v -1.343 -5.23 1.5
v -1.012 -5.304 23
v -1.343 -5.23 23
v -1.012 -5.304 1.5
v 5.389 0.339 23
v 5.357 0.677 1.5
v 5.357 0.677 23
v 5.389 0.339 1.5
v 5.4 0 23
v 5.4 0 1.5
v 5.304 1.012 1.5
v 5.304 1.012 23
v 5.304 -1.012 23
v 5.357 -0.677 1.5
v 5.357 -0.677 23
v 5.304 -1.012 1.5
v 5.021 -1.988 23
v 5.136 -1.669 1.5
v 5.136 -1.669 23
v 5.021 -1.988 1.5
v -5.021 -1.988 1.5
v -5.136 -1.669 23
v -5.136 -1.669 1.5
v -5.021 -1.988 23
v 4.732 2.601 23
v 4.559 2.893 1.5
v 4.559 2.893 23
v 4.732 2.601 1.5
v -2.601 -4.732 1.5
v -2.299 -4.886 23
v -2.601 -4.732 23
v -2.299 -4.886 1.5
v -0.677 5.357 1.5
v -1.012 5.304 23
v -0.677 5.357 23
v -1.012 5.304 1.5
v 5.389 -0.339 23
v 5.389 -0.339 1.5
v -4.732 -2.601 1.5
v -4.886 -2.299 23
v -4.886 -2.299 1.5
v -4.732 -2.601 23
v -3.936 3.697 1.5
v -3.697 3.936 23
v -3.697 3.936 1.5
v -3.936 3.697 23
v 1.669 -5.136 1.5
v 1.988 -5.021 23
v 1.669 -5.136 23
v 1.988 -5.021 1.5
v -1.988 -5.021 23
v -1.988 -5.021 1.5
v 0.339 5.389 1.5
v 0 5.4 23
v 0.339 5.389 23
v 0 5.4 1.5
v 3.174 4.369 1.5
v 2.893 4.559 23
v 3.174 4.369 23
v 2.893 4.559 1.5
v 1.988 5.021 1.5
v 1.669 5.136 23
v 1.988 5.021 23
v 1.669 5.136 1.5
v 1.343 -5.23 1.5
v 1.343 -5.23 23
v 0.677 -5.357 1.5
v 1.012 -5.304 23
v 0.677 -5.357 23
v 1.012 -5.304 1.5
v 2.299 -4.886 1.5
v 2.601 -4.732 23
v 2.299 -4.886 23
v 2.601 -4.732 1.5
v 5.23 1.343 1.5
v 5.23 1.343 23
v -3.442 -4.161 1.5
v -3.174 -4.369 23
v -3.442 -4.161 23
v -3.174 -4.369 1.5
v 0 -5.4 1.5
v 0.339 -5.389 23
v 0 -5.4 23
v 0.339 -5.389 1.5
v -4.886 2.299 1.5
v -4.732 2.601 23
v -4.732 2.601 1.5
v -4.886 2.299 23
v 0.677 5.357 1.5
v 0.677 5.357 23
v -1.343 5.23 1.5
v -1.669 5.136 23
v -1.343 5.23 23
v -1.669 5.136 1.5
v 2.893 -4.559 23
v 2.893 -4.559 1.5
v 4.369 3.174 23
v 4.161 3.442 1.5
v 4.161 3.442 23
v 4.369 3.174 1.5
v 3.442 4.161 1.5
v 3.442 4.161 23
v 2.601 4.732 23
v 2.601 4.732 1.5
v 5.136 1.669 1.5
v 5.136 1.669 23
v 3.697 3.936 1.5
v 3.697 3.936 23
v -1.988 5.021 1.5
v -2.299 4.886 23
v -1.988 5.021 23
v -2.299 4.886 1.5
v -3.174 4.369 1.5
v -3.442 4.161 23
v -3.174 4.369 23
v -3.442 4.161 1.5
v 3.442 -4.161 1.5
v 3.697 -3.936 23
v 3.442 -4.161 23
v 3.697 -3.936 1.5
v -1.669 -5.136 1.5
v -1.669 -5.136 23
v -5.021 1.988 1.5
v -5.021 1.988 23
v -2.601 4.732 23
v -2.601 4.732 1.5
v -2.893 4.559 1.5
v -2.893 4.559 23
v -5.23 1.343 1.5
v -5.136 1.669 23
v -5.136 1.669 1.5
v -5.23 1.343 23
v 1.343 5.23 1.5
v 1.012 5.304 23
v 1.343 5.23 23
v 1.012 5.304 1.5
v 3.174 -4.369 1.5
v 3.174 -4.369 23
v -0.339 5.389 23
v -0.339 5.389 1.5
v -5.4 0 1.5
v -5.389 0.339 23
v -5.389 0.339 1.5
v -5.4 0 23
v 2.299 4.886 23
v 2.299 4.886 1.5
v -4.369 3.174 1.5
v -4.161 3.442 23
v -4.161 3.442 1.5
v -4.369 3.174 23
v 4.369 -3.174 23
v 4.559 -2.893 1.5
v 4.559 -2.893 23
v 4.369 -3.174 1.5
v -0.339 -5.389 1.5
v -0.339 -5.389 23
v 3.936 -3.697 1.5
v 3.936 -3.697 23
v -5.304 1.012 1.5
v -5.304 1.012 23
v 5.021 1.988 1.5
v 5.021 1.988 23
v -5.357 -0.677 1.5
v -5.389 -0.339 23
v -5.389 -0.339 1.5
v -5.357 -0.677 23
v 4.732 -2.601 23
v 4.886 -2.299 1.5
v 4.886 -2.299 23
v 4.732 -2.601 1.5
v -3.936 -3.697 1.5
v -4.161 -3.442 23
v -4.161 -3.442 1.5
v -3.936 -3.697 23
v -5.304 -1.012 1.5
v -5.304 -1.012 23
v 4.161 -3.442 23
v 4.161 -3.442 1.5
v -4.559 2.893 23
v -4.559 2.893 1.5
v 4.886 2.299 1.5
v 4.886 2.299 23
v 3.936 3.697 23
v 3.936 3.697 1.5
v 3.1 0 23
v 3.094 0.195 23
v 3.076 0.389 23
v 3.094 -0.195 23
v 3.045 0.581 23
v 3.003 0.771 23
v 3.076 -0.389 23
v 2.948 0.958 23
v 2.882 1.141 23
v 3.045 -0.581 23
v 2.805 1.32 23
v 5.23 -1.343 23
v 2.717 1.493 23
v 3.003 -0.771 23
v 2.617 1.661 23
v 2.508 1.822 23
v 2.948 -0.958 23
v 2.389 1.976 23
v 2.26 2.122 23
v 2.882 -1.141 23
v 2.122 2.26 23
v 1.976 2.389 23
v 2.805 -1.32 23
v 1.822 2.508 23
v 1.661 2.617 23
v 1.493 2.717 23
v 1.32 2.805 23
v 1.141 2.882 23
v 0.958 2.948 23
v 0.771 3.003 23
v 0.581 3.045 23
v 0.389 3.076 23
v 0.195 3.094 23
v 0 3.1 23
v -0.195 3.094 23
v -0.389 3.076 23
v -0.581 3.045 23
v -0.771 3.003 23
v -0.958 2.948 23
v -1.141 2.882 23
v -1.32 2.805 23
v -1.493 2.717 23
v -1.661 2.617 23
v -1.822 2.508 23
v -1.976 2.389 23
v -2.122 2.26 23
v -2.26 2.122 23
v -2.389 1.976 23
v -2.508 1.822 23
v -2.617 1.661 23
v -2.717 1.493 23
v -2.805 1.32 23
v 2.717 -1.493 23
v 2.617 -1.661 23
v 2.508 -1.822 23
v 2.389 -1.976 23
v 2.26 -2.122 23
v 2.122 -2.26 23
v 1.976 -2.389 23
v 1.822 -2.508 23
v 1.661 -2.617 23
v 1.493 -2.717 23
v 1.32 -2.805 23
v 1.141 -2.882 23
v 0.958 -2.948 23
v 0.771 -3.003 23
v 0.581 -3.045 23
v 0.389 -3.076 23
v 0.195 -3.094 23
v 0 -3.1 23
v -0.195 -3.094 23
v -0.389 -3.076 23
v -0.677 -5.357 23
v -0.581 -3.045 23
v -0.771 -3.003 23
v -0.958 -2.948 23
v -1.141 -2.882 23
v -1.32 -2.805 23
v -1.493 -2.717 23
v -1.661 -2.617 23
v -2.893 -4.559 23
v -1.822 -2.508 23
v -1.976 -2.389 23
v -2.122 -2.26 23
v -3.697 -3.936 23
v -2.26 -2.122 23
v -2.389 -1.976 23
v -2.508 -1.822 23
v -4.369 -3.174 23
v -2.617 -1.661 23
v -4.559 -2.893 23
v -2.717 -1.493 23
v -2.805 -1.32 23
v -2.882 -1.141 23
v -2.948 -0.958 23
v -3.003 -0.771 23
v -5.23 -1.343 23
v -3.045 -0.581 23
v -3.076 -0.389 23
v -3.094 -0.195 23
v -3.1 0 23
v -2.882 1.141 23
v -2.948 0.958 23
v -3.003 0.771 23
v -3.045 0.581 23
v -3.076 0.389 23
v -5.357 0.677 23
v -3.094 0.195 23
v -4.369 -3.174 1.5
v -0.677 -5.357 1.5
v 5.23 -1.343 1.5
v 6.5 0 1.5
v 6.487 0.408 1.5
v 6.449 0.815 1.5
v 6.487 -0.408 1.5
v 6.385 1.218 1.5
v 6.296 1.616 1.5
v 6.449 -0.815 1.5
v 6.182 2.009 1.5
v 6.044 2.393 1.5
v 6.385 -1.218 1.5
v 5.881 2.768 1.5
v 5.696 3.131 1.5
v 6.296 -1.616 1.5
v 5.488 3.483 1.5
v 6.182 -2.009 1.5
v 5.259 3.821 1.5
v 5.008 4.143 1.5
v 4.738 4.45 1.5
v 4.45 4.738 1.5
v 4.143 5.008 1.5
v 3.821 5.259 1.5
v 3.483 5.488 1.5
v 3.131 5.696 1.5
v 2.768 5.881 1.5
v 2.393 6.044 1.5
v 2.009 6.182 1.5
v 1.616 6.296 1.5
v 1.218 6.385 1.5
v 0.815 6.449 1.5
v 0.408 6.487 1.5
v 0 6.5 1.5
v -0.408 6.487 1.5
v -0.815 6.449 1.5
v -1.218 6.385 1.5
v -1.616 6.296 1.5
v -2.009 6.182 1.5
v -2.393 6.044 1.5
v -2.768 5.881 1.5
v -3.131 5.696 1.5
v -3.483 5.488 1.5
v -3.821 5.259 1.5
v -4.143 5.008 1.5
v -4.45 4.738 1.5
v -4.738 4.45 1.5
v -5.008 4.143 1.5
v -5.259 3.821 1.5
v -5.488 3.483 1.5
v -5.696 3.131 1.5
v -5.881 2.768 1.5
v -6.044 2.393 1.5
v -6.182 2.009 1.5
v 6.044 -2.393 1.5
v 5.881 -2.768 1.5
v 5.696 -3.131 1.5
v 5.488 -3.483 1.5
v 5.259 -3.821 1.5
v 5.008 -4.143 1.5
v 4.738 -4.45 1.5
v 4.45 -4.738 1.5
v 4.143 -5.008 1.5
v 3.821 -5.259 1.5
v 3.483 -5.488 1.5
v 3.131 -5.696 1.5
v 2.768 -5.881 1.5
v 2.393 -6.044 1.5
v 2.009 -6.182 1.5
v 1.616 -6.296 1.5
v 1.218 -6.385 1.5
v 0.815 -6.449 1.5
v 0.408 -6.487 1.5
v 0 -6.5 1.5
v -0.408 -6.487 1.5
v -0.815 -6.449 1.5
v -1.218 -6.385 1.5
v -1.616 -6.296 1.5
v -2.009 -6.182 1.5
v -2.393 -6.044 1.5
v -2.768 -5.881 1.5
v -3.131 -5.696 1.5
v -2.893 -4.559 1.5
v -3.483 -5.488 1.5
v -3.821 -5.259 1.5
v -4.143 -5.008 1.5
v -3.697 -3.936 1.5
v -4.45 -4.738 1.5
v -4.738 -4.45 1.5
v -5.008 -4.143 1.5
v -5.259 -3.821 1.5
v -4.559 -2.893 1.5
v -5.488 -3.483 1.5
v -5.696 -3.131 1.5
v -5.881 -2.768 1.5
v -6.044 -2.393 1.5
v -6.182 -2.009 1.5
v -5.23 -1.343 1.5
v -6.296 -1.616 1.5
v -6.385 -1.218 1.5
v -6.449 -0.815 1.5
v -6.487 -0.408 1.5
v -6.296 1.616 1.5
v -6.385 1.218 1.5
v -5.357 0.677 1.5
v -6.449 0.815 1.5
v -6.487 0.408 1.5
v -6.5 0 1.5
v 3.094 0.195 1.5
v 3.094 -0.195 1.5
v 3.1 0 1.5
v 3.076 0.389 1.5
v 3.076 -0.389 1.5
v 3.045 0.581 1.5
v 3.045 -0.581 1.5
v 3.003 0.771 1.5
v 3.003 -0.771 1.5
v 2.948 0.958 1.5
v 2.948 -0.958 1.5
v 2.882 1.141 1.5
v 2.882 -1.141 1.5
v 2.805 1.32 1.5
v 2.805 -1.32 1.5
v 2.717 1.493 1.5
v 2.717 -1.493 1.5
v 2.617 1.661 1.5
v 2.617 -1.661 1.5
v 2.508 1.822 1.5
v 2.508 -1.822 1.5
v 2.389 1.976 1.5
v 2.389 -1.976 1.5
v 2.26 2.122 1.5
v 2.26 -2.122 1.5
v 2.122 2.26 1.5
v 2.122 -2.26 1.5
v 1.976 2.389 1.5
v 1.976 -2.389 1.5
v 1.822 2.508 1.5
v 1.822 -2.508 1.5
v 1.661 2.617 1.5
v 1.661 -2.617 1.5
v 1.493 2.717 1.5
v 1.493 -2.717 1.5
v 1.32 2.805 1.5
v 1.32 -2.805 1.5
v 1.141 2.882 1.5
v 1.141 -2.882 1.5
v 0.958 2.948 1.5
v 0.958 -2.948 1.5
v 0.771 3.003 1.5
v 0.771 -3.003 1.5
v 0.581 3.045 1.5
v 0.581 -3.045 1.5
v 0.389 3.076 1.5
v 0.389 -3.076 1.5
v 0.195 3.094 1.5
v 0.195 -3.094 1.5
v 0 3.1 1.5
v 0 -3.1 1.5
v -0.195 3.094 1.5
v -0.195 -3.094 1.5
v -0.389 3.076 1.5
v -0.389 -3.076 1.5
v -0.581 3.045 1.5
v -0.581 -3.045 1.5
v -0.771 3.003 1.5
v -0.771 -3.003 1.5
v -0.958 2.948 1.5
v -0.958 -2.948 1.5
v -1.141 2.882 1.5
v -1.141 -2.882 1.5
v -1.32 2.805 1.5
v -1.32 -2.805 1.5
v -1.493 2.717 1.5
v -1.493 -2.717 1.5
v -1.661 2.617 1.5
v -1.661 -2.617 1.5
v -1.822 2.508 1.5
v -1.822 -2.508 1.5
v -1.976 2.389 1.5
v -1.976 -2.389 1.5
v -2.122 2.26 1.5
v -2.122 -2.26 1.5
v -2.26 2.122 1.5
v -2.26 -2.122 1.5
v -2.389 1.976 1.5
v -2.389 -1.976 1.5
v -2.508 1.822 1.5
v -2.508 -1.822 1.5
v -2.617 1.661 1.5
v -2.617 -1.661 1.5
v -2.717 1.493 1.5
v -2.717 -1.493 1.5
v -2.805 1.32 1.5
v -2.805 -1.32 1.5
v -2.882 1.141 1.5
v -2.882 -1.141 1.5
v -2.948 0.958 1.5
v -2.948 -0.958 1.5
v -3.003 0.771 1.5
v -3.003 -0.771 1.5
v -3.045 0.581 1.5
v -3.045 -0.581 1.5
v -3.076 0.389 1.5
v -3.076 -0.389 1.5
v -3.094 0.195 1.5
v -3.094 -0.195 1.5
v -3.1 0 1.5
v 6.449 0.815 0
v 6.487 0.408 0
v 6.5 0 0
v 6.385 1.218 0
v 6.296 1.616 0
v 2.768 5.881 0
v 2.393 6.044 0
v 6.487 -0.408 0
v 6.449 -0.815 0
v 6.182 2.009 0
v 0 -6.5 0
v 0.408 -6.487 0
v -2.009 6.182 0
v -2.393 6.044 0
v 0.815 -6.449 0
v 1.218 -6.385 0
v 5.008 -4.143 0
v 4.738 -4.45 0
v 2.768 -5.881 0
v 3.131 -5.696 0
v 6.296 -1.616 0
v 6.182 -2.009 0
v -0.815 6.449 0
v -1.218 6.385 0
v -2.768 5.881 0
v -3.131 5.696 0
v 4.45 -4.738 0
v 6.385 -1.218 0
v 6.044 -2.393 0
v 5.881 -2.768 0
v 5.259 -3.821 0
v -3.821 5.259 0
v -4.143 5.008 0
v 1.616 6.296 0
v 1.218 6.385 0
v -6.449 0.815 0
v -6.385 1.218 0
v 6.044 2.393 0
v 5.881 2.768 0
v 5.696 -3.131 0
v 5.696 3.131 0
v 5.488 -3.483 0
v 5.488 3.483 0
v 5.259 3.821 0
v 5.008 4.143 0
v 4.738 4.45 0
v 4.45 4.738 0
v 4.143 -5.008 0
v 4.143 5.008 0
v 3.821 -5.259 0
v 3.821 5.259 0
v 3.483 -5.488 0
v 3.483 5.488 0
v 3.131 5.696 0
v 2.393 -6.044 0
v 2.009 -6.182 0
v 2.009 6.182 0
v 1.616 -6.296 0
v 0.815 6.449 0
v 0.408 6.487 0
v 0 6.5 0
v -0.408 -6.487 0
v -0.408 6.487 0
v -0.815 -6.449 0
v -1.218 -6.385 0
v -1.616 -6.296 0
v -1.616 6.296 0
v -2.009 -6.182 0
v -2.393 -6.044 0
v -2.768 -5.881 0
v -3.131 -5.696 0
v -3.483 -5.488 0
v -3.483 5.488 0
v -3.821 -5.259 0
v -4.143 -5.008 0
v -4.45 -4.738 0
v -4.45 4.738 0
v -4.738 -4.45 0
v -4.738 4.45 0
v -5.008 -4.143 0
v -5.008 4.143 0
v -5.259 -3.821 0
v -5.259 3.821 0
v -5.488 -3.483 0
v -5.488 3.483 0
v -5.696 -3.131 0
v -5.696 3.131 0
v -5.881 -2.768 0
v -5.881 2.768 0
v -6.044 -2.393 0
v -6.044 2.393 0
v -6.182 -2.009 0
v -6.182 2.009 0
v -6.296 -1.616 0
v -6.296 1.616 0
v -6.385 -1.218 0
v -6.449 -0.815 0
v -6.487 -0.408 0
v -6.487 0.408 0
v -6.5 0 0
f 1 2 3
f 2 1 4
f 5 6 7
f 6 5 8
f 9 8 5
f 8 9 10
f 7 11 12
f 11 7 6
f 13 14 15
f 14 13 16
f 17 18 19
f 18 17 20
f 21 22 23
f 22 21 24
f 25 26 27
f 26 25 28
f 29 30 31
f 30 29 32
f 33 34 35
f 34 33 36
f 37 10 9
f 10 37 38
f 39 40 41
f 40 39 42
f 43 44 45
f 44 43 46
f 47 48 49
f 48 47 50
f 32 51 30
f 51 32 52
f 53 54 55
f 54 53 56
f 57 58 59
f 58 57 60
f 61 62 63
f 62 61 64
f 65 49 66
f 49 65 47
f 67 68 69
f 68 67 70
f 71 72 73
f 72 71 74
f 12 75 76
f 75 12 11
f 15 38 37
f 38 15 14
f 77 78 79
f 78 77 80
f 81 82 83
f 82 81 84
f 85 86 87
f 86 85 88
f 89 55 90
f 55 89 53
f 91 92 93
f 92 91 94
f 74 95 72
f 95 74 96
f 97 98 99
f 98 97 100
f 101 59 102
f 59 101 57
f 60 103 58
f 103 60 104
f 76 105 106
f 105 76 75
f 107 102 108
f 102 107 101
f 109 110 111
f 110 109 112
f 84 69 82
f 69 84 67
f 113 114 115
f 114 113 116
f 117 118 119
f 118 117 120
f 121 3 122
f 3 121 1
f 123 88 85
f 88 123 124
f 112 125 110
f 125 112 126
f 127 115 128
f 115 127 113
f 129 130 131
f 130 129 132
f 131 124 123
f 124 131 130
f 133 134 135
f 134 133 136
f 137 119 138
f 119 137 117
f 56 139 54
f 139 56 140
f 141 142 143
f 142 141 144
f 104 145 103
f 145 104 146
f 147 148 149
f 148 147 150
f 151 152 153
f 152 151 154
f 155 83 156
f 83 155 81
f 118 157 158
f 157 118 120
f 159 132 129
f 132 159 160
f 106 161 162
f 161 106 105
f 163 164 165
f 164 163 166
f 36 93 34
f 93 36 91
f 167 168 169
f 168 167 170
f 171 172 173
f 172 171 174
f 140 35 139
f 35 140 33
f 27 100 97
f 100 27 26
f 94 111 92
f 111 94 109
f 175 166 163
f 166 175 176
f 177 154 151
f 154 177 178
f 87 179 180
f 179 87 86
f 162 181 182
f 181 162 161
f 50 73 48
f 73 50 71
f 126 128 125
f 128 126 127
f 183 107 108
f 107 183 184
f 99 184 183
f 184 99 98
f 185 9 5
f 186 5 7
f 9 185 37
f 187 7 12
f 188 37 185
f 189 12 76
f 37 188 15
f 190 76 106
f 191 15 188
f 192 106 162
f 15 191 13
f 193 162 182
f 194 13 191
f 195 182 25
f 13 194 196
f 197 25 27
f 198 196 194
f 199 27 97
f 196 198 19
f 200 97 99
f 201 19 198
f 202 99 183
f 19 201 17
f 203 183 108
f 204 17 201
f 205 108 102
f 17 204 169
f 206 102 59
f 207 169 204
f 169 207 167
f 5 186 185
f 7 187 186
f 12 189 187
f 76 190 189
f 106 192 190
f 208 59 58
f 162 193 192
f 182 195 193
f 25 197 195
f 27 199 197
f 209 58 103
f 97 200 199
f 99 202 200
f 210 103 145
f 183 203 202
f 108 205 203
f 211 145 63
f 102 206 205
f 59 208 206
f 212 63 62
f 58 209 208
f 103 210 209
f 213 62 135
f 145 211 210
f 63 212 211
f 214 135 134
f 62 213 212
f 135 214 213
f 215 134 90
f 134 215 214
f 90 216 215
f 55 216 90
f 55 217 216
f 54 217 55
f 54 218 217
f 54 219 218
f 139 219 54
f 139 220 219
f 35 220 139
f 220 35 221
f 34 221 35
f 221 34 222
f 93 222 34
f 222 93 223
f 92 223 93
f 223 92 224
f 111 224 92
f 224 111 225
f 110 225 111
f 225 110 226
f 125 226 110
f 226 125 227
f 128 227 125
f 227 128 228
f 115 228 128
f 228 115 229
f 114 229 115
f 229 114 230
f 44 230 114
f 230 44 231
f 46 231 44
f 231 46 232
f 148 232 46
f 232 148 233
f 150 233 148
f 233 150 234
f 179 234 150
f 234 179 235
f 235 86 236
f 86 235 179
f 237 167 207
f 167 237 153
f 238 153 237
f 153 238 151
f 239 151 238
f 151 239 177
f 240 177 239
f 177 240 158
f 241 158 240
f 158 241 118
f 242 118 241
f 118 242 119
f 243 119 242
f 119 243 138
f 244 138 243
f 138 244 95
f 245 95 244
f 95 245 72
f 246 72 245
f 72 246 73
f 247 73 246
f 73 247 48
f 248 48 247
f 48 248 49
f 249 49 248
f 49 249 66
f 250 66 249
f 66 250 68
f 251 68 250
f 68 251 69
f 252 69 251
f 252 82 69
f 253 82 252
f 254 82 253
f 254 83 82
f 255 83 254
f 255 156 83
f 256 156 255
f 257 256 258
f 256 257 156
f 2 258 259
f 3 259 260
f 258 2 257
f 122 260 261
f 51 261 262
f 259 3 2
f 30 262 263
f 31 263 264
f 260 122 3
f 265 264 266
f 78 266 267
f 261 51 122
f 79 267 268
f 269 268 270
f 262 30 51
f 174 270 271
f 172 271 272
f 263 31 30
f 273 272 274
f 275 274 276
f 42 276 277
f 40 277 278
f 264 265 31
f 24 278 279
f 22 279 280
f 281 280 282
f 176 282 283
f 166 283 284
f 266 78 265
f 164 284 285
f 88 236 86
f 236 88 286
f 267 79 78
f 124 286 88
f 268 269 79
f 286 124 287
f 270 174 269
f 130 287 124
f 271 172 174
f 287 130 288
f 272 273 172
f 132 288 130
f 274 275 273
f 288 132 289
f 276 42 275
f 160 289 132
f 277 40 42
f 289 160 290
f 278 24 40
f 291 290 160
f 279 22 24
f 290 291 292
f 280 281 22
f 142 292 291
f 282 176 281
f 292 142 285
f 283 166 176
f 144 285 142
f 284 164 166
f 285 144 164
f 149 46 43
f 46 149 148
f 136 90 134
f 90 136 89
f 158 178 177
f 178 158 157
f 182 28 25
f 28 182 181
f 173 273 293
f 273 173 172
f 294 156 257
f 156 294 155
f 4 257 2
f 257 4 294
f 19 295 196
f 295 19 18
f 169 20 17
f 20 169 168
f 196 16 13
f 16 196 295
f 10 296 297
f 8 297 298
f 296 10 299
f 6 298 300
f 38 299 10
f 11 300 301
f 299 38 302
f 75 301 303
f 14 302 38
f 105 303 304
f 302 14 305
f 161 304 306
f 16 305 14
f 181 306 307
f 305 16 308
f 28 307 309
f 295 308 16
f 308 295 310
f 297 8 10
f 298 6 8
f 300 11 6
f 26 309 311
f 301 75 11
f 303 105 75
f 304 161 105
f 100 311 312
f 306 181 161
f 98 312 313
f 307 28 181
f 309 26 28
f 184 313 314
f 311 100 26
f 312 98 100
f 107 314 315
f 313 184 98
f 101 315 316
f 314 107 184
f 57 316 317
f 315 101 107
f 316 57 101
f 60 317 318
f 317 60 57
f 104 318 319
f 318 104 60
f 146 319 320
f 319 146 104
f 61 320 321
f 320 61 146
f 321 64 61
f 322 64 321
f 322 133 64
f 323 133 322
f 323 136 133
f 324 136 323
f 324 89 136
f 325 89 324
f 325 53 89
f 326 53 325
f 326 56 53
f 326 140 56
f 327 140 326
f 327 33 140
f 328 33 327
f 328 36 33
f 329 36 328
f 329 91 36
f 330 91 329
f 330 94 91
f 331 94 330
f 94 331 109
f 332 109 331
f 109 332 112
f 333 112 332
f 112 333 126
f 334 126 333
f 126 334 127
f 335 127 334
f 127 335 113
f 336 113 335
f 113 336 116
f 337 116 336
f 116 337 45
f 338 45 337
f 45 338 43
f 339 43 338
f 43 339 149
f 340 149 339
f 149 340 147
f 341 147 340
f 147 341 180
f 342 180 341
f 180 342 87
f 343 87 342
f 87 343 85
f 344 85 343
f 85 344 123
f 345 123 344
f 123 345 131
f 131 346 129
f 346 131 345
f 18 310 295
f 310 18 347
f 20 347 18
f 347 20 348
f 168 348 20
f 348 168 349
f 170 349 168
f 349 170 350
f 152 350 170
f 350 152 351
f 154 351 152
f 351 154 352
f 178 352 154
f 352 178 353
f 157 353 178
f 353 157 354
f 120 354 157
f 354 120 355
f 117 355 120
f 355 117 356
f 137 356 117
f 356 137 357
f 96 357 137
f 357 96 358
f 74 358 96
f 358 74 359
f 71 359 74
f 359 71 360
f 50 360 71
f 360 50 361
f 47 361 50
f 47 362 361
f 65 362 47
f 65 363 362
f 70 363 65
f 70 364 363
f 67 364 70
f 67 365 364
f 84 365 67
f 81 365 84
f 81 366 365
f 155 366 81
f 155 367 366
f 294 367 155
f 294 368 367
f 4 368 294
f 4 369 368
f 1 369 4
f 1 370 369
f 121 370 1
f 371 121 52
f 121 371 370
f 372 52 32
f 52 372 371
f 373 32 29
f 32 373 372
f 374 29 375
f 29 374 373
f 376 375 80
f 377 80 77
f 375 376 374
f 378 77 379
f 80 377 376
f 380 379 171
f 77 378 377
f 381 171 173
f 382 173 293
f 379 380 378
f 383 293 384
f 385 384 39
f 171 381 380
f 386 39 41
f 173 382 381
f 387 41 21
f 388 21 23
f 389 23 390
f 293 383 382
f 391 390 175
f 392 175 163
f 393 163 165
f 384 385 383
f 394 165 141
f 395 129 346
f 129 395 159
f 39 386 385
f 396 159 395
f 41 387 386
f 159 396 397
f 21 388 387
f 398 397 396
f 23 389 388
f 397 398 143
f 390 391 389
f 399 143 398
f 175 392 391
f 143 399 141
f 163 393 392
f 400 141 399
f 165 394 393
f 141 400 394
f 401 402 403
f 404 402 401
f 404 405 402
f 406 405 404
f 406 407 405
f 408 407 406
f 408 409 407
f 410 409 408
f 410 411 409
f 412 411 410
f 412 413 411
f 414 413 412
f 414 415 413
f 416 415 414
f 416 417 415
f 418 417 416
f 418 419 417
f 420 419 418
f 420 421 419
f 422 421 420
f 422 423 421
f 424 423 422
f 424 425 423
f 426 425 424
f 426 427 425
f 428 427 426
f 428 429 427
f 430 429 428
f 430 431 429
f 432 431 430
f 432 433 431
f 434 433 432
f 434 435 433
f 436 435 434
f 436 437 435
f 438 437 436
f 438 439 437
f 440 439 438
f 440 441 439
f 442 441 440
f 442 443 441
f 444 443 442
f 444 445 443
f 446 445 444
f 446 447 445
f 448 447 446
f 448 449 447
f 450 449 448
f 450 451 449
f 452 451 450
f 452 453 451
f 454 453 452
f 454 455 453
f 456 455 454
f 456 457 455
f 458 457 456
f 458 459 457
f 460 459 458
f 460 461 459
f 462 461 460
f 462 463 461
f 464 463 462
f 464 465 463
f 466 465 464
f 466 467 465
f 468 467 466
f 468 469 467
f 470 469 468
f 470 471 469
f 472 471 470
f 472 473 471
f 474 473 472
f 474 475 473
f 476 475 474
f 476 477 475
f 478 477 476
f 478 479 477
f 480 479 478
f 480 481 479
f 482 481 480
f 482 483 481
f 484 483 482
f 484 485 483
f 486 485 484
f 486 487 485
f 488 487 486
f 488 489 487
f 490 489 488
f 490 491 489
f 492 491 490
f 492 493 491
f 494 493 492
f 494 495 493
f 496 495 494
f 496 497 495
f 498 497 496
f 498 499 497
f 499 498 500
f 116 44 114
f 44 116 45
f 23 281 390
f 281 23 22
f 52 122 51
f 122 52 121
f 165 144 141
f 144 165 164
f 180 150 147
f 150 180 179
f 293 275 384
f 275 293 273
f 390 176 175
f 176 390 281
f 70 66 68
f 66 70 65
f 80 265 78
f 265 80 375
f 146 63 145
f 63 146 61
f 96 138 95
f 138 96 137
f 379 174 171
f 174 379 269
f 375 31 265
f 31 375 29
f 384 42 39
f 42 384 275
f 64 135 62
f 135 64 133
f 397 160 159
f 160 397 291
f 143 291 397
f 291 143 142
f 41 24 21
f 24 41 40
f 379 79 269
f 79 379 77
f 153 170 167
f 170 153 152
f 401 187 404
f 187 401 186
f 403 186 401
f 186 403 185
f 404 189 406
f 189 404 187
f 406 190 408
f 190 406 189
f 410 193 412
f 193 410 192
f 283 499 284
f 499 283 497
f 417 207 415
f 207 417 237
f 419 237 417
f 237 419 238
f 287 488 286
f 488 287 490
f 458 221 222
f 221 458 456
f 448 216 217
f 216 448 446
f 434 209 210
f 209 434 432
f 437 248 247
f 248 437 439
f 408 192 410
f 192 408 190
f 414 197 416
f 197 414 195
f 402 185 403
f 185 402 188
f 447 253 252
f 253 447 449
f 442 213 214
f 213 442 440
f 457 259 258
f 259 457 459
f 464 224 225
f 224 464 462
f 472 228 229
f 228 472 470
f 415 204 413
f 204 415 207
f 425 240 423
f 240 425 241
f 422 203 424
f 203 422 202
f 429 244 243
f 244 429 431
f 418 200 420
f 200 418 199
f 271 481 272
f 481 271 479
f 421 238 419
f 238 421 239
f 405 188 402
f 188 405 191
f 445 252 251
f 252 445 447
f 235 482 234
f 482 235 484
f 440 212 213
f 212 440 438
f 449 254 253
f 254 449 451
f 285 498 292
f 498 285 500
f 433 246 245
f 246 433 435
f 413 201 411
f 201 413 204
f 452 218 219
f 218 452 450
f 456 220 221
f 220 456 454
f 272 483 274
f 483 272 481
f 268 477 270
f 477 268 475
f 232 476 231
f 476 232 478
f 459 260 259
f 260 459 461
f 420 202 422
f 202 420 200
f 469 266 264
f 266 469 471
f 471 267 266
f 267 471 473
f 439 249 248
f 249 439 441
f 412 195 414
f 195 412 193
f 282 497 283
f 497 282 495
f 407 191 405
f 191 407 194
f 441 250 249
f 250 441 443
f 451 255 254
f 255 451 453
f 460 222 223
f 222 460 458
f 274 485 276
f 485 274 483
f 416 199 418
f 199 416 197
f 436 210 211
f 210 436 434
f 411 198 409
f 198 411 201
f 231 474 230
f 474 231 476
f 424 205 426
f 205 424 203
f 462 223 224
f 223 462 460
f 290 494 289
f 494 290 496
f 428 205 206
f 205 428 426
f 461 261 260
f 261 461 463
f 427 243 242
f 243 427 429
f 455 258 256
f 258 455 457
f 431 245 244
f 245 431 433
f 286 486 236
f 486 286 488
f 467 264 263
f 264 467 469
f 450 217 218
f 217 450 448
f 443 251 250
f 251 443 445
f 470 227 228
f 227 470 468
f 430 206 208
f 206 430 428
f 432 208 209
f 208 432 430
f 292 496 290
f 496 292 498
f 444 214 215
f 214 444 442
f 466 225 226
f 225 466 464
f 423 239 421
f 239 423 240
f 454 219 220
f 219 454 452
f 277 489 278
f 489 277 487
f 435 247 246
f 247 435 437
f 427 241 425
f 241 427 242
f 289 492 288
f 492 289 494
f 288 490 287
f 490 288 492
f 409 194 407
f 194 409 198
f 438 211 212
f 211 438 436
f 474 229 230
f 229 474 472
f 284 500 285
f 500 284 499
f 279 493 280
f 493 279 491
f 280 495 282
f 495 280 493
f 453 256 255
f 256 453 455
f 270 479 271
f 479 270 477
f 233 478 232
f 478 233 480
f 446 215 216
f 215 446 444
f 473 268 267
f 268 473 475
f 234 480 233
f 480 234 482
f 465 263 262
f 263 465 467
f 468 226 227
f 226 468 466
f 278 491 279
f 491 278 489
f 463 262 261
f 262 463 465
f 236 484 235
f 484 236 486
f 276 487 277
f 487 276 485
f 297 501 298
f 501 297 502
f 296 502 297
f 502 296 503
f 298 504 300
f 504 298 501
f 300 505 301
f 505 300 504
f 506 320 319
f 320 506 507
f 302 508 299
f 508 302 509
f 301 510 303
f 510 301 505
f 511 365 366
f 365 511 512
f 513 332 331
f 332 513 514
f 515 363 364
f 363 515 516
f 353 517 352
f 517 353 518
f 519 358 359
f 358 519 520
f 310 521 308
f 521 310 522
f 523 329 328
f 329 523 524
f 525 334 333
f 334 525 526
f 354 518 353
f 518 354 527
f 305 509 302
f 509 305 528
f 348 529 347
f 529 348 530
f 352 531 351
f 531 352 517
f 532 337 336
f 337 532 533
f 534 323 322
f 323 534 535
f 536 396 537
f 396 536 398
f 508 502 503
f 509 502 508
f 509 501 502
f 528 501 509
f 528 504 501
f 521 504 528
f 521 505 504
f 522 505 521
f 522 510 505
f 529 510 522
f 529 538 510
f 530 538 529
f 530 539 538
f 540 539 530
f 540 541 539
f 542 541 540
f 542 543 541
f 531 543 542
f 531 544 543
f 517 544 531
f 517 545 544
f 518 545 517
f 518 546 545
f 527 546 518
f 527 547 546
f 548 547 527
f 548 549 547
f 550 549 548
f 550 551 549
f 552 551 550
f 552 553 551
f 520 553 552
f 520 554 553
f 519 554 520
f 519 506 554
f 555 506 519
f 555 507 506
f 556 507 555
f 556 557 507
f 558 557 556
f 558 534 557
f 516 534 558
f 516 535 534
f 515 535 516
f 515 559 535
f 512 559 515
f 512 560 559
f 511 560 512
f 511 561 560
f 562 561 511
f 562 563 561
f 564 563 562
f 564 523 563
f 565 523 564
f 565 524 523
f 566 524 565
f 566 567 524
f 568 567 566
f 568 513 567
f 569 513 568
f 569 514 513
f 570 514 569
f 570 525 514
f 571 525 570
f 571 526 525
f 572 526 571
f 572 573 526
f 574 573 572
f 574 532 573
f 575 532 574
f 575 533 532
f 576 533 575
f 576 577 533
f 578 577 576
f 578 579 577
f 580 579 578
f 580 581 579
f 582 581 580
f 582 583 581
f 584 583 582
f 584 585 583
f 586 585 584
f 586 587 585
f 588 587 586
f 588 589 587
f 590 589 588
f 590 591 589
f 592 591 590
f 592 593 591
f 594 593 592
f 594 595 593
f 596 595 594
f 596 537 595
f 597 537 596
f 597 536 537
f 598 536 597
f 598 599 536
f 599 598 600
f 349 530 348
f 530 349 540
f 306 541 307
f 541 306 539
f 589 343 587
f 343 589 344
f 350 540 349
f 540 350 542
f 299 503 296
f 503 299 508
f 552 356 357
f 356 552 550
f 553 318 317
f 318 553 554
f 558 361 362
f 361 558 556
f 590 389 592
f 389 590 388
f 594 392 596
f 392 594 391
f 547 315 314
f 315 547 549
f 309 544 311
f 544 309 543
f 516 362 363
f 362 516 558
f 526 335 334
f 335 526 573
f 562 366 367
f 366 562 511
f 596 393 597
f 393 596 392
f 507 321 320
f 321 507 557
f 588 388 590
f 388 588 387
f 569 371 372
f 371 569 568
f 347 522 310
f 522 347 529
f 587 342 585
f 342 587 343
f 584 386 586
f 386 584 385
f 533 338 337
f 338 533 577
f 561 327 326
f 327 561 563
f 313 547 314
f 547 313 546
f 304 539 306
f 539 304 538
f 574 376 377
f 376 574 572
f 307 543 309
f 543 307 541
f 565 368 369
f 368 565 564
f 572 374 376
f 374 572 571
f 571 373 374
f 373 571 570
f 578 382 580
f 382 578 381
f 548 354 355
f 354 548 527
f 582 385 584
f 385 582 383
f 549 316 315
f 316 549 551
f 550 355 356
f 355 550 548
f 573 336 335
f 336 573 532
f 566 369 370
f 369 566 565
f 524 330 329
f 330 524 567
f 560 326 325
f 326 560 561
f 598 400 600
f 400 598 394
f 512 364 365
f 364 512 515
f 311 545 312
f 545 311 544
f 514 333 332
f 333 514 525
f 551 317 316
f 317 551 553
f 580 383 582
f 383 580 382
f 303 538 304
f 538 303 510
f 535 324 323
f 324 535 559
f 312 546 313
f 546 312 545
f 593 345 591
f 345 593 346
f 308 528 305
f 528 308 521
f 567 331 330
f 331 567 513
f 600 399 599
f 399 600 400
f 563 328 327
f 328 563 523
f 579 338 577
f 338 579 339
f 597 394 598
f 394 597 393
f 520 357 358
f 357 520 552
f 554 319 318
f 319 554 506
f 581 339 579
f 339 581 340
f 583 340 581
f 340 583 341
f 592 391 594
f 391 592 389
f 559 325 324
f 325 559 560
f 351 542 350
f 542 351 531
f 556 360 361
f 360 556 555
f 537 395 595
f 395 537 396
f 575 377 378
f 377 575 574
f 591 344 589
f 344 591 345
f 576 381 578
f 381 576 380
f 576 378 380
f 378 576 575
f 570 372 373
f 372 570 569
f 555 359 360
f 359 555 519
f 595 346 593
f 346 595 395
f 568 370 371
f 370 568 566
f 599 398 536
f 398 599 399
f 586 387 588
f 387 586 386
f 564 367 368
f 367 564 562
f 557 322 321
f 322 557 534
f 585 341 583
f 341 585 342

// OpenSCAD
// Dimensions for the PCR tube adapter sleeve (Final verified version)

// Collar dimensions
collar_diameter = 13;  // Diameter of the collar in mm
collar_thickness = 1.5; // Thickness of the collar in mm

// Sleeve body dimensions
sleeve_outer_diameter = 10.8; // Outer diameter of the sleeve body in mm
sleeve_height = 21.5;         // Height of the sleeve body (rises from z=1.5 to z=21.5)

// Bore dimensions
bore_diameter = 6.2;       // Diameter of the central bore in mm

// Positioning and tolerances
collar_z_top = collar_thickness; // Collar occupies Z: [0, 1.5]
sleeve_bottom_z = collar_thickness; // Sleeve starts at Z=1.5
sleeve_top_z = sleeve_bottom_z + sleeve_height; // Total height: 23.0

// --- 1. Collar ---
module adapter_collar() {
    // Cylinder with diameter 13 mm (Radius = 6.5) and height 1.5 mm
    cylinder(h = collar_thickness, r = collar_diameter / 2, $fn = 100); // Increased fn for better circularity
}

// --- 2. Sleeve Body ---
module adapter_sleeve() {
    difference() {
        // Outer shape of the sleeve body (Cylinder with OD 10.8 mm, Radius = 5.4)
        cylinder(h = sleeve_height, r = sleeve_outer_diameter / 2, $fn = 100); // Increased fn for better circularity

        // Inner bore (cutout). Translate slightly below to ensure full cut through the body.
        translate([0, 0, -0.1]) { 
            cylinder(h = sleeve_height + 0.2, r = bore_diameter / 2, $fn = 100);
        }
    }
}

// --- Assembly ---

// Place the collar at the bottom (z=0 to z=1.5)
translate([0, 0, 0]) {
    adapter_collar();
}

// Place the sleeve body starting exactly where the collar ends (z=1.5)
translate([0, 0, sleeve_bottom_z]) {
    adapter_sleeve();
}
